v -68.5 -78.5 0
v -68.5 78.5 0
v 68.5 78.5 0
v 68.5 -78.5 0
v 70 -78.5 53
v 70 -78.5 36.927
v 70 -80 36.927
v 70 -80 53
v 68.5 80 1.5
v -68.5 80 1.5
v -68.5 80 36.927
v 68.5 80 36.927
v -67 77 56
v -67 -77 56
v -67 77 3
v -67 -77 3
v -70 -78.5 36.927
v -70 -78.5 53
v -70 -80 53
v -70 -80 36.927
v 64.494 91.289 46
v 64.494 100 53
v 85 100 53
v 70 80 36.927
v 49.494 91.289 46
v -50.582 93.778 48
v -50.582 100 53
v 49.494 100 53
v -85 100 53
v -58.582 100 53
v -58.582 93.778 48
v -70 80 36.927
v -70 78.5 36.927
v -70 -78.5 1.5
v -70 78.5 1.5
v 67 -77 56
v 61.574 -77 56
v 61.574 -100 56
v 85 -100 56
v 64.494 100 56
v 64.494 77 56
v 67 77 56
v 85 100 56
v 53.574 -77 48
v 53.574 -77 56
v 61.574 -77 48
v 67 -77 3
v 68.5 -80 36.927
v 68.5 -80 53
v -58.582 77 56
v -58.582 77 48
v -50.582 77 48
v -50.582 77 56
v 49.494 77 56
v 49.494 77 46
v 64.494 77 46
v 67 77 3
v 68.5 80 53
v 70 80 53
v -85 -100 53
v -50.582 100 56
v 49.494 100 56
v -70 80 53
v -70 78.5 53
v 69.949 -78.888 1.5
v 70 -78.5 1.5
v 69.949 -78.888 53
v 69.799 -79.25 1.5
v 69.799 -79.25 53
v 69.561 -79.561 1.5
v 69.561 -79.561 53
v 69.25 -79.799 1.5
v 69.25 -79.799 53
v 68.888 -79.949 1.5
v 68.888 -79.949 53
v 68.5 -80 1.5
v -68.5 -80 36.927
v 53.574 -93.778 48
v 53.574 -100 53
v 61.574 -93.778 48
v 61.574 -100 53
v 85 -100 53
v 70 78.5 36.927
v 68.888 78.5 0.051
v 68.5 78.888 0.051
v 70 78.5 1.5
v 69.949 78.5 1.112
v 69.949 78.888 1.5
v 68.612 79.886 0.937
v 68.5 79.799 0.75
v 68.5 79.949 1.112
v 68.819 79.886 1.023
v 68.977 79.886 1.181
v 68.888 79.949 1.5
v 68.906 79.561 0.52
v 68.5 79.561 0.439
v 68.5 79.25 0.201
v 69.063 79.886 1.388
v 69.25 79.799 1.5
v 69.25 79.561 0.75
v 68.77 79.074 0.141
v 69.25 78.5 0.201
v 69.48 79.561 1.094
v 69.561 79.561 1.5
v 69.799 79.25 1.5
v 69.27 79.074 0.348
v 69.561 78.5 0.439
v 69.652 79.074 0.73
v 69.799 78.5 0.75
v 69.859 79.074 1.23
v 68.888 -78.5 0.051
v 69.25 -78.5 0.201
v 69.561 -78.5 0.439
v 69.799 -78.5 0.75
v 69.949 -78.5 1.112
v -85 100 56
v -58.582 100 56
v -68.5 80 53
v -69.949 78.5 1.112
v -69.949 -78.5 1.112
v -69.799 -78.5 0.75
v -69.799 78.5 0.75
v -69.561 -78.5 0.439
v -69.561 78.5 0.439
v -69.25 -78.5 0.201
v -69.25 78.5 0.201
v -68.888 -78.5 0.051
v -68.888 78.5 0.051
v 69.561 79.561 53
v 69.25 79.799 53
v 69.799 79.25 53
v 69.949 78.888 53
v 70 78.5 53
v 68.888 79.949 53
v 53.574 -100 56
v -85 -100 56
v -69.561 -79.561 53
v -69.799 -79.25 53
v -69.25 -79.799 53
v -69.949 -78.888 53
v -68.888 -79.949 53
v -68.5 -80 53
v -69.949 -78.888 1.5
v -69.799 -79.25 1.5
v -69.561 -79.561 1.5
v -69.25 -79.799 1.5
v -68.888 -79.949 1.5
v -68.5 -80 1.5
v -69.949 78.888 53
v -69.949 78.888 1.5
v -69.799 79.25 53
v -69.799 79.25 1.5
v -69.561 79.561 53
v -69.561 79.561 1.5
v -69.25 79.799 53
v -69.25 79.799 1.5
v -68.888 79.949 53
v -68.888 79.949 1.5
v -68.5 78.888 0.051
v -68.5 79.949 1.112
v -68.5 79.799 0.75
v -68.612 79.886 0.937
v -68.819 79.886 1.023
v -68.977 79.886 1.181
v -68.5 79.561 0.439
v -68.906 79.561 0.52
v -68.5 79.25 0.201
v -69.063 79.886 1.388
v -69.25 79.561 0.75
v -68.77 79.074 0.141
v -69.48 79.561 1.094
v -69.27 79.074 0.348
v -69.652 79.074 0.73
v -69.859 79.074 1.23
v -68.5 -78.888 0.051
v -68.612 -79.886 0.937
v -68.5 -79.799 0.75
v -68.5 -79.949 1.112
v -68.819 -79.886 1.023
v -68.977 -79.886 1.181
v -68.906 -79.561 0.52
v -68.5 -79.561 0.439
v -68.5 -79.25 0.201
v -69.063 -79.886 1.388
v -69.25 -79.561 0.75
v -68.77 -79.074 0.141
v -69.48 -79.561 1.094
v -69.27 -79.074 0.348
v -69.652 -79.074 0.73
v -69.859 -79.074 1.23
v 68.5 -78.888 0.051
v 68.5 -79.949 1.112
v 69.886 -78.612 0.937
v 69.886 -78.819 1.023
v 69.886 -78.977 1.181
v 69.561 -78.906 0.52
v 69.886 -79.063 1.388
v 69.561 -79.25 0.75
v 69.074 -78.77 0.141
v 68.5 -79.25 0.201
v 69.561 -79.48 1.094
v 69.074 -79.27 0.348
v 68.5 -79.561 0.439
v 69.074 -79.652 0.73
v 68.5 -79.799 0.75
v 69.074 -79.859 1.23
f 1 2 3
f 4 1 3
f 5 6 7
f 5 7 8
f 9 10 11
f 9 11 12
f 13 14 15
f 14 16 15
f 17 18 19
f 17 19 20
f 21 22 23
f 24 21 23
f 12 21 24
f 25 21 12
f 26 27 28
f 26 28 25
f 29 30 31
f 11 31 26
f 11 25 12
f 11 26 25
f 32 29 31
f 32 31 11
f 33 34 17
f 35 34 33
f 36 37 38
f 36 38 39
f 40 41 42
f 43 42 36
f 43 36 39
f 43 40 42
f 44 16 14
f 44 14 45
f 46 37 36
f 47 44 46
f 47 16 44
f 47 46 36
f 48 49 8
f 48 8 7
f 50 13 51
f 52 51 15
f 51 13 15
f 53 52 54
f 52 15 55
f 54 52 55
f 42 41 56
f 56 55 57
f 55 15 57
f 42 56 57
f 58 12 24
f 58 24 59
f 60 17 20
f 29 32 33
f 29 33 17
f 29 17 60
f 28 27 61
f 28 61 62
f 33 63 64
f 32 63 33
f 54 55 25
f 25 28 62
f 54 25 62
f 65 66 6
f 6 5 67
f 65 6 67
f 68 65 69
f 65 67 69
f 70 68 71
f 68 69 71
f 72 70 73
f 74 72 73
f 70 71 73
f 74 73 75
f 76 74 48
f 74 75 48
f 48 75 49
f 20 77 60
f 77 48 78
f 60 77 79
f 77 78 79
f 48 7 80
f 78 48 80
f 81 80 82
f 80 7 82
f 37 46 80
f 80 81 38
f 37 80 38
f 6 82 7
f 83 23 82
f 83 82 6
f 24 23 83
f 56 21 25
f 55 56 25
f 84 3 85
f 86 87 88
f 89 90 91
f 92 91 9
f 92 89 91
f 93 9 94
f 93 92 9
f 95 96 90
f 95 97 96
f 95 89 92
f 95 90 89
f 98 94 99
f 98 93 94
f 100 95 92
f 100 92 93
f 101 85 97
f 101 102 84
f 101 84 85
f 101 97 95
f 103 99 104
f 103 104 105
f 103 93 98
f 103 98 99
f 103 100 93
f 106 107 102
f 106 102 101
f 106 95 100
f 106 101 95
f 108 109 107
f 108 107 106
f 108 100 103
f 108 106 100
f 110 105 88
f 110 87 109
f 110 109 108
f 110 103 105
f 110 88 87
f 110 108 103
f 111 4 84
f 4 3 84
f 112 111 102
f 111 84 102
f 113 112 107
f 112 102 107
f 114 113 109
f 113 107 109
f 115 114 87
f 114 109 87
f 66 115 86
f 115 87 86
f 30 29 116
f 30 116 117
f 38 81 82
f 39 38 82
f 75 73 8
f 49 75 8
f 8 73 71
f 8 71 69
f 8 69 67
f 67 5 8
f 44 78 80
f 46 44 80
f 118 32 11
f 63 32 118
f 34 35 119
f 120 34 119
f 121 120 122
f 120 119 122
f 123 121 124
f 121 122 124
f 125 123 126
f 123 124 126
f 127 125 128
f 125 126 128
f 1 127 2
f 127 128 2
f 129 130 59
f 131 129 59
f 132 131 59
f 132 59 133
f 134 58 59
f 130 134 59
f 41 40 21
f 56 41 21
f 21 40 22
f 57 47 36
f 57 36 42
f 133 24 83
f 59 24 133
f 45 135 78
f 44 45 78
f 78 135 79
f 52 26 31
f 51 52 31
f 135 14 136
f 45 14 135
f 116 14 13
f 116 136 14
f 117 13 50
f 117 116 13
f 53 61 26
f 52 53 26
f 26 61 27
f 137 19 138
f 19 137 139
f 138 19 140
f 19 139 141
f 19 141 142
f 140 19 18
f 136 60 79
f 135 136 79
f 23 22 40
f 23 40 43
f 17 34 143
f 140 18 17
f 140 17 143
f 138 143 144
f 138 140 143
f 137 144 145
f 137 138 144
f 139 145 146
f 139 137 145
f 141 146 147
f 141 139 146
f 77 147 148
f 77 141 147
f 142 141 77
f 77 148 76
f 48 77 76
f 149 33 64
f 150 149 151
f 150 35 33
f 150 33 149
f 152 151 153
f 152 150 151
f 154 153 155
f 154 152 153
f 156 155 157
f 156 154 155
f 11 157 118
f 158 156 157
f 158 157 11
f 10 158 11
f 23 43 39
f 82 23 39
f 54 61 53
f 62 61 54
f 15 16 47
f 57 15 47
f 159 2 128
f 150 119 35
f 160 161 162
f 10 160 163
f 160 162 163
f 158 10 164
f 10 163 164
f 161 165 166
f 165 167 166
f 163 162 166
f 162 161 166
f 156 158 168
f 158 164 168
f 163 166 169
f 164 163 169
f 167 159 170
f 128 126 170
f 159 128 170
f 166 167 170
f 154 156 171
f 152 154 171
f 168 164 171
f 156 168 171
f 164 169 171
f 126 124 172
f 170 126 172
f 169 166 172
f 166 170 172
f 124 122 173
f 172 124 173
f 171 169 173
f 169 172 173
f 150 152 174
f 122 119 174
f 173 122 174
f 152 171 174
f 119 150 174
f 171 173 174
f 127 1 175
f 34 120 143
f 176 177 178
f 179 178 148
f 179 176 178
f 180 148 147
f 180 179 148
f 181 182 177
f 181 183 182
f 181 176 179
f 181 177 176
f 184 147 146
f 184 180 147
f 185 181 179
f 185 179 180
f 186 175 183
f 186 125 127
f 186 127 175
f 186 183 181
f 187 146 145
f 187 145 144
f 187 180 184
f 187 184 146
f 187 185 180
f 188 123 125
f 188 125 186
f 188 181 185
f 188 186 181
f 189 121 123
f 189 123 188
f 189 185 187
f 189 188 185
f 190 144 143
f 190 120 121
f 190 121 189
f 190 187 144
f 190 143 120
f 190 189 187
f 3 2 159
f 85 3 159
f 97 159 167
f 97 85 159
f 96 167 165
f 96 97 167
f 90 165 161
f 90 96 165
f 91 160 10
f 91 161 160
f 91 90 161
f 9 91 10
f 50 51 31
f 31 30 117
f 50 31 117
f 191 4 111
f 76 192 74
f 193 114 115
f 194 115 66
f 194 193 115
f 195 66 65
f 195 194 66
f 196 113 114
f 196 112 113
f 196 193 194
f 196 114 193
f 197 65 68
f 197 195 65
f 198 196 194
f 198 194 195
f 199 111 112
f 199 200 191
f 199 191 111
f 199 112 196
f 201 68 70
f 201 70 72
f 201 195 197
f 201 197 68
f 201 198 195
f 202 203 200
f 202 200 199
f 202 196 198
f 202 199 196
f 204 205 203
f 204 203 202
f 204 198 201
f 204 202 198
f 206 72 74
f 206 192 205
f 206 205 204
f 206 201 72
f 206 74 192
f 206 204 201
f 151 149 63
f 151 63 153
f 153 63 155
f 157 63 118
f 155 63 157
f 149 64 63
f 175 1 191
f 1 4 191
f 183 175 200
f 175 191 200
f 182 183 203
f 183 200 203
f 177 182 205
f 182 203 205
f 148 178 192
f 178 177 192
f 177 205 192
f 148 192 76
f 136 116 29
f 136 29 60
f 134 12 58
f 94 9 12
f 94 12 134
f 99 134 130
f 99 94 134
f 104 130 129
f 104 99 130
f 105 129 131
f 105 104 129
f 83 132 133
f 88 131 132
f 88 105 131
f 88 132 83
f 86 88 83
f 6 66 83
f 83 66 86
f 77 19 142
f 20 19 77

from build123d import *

# Parameters (mm, degrees)
F0_W      = 140
F0_H      = 160
F1_DEPTH  = 3
F2_W      = 140
F2_H      = 160
F2_W_2    = 134
F2_H_2    = 154
F3_DEPTH  = 50
F4_W      = 170
F4_H      = 200
F4_W_2    = 140
F4_H_2    = 160
F4_W_3    = 134
F4_H_3    = 154
F5_DEPTH  = 3
F8_R      = 1.5
F10_DEPTH = 170
F6_W      = 15
F6_H      = 7
F6_H_2    = 3
F6_W_2    = 8
F6_H_3    = 5
F11_DEPTH = 25
F7_W      = 8
F7_H      = 5
F7_H_2    = 3
F12_DEPTH = 25
F14_DEPTH = 200
F16_DEPTH = 200
F18_DEPTH = 170


with BuildPart() as f1:
    # F0 (on Top) → F1 (new body)
    with BuildSketch(Plane.XY):
        Rectangle(F0_W, F0_H)
    extrude(amount=F1_DEPTH)

    # F2 (on face) → F3 (join)
    with BuildSketch(Plane.XY.offset(3)):
        Rectangle(F2_W, F2_H)
        Rectangle(F2_W_2, F2_H_2, mode=Mode.SUBTRACT)
    extrude(amount=F3_DEPTH)

    # F4 (on face) → F5 (join)
    with BuildSketch(Plane.XY.offset(53)):
        Rectangle(F4_W, F4_H)
        Rectangle(F4_W_2, F4_H_2, mode=Mode.SUBTRACT)
        Rectangle(F4_W_2, F4_H_2)
        Rectangle(F4_W_3, F4_H_3, mode=Mode.SUBTRACT)
    extrude(amount=F5_DEPTH)

    # F8
    f8_edges = [f1.edges().sort_by_distance(p)[0] for p in [
        (-70, 0, 0),
        (0, -80, 0),
        (70, 0, 0),
        (0, 80, 0),
        (-70, 80, 26.5),
        (70, 80, 26.5),
        (-70, -80, 26.5),
        (70, -80, 26.5),
    ]]
    fillet(f8_edges, radius=F8_R)

    # F9 (on face) → F10 (join, through all)
    with BuildSketch(Plane(origin=(-85, 0, 0), x_dir=(0, -1, 0), z_dir=(-1, 0, 0))):
        Polygon((-80, 53), (-100, 53), (-80, 36.92748), align=None)
        Polygon((100, 53), (80, 53), (80, 36.92748), align=None)
    extrude(amount=-F10_DEPTH)

    # F6 (on face) → F11 (cut)
    with BuildSketch(Plane(origin=(0, 100, 0), x_dir=(-1, 0, 0), z_dir=(0, 1, 0))):
        with Locations((-56.994275, 49.5)):
            Rectangle(F6_W, F6_H)
        with Locations((-56.994275, 54.5)):
            Rectangle(F6_W, F6_H_2)
        with Locations((54.582062, 50.5)):
            Rectangle(F6_W_2, F6_H_3)
        with Locations((54.582062, 54.5)):
            Rectangle(F6_W_2, F6_H_2)
    extrude(amount=-F11_DEPTH, mode=Mode.SUBTRACT)

    # F7 (on face) → F12 (cut)
    with BuildSketch(Plane.XZ.offset(100)):
        with Locations((57.574429, 50.5)):
            Rectangle(F7_W, F7_H)
        with Locations((57.574429, 54.5)):
            Rectangle(F7_W, F7_H_2)
    extrude(amount=-F12_DEPTH, mode=Mode.SUBTRACT)

    # F13 (on face) → F14 (join, through all)
    with BuildSketch(Plane(origin=(0, 100, 0), x_dir=(-1, 0, 0), z_dir=(0, 1, 0))):
        Polygon((-70, 53), (-85, 53), (-70, 36.92748), align=None)
        Polygon((70, 53), (70, 36.92748), (85, 53), align=None)
    extrude(amount=-F14_DEPTH)

    # F15 (on face) → F16 (cut, through all)
    with BuildSketch(Plane(origin=(0, 100, 0), x_dir=(-1, 0, 0), z_dir=(0, 1, 0))):
        Polygon((-70, 36.92748), (-85, 53), (-85, 36.92748), align=None)
        Polygon((85, 36.92748), (85, 53), (70, 36.92748), align=None)
    extrude(amount=-F16_DEPTH, mode=Mode.SUBTRACT)

    # F17 (on face) → F18 (cut, through all)
    with BuildSketch(Plane.YZ.offset(85)):
        Polygon((-80, 36.92748), (-100, 53), (-100, 36.92748), align=None)
        Polygon((100, 36.92748), (100, 53), (80, 36.92748), align=None)
    extrude(amount=-F18_DEPTH, mode=Mode.SUBTRACT)


solid = f1.part
